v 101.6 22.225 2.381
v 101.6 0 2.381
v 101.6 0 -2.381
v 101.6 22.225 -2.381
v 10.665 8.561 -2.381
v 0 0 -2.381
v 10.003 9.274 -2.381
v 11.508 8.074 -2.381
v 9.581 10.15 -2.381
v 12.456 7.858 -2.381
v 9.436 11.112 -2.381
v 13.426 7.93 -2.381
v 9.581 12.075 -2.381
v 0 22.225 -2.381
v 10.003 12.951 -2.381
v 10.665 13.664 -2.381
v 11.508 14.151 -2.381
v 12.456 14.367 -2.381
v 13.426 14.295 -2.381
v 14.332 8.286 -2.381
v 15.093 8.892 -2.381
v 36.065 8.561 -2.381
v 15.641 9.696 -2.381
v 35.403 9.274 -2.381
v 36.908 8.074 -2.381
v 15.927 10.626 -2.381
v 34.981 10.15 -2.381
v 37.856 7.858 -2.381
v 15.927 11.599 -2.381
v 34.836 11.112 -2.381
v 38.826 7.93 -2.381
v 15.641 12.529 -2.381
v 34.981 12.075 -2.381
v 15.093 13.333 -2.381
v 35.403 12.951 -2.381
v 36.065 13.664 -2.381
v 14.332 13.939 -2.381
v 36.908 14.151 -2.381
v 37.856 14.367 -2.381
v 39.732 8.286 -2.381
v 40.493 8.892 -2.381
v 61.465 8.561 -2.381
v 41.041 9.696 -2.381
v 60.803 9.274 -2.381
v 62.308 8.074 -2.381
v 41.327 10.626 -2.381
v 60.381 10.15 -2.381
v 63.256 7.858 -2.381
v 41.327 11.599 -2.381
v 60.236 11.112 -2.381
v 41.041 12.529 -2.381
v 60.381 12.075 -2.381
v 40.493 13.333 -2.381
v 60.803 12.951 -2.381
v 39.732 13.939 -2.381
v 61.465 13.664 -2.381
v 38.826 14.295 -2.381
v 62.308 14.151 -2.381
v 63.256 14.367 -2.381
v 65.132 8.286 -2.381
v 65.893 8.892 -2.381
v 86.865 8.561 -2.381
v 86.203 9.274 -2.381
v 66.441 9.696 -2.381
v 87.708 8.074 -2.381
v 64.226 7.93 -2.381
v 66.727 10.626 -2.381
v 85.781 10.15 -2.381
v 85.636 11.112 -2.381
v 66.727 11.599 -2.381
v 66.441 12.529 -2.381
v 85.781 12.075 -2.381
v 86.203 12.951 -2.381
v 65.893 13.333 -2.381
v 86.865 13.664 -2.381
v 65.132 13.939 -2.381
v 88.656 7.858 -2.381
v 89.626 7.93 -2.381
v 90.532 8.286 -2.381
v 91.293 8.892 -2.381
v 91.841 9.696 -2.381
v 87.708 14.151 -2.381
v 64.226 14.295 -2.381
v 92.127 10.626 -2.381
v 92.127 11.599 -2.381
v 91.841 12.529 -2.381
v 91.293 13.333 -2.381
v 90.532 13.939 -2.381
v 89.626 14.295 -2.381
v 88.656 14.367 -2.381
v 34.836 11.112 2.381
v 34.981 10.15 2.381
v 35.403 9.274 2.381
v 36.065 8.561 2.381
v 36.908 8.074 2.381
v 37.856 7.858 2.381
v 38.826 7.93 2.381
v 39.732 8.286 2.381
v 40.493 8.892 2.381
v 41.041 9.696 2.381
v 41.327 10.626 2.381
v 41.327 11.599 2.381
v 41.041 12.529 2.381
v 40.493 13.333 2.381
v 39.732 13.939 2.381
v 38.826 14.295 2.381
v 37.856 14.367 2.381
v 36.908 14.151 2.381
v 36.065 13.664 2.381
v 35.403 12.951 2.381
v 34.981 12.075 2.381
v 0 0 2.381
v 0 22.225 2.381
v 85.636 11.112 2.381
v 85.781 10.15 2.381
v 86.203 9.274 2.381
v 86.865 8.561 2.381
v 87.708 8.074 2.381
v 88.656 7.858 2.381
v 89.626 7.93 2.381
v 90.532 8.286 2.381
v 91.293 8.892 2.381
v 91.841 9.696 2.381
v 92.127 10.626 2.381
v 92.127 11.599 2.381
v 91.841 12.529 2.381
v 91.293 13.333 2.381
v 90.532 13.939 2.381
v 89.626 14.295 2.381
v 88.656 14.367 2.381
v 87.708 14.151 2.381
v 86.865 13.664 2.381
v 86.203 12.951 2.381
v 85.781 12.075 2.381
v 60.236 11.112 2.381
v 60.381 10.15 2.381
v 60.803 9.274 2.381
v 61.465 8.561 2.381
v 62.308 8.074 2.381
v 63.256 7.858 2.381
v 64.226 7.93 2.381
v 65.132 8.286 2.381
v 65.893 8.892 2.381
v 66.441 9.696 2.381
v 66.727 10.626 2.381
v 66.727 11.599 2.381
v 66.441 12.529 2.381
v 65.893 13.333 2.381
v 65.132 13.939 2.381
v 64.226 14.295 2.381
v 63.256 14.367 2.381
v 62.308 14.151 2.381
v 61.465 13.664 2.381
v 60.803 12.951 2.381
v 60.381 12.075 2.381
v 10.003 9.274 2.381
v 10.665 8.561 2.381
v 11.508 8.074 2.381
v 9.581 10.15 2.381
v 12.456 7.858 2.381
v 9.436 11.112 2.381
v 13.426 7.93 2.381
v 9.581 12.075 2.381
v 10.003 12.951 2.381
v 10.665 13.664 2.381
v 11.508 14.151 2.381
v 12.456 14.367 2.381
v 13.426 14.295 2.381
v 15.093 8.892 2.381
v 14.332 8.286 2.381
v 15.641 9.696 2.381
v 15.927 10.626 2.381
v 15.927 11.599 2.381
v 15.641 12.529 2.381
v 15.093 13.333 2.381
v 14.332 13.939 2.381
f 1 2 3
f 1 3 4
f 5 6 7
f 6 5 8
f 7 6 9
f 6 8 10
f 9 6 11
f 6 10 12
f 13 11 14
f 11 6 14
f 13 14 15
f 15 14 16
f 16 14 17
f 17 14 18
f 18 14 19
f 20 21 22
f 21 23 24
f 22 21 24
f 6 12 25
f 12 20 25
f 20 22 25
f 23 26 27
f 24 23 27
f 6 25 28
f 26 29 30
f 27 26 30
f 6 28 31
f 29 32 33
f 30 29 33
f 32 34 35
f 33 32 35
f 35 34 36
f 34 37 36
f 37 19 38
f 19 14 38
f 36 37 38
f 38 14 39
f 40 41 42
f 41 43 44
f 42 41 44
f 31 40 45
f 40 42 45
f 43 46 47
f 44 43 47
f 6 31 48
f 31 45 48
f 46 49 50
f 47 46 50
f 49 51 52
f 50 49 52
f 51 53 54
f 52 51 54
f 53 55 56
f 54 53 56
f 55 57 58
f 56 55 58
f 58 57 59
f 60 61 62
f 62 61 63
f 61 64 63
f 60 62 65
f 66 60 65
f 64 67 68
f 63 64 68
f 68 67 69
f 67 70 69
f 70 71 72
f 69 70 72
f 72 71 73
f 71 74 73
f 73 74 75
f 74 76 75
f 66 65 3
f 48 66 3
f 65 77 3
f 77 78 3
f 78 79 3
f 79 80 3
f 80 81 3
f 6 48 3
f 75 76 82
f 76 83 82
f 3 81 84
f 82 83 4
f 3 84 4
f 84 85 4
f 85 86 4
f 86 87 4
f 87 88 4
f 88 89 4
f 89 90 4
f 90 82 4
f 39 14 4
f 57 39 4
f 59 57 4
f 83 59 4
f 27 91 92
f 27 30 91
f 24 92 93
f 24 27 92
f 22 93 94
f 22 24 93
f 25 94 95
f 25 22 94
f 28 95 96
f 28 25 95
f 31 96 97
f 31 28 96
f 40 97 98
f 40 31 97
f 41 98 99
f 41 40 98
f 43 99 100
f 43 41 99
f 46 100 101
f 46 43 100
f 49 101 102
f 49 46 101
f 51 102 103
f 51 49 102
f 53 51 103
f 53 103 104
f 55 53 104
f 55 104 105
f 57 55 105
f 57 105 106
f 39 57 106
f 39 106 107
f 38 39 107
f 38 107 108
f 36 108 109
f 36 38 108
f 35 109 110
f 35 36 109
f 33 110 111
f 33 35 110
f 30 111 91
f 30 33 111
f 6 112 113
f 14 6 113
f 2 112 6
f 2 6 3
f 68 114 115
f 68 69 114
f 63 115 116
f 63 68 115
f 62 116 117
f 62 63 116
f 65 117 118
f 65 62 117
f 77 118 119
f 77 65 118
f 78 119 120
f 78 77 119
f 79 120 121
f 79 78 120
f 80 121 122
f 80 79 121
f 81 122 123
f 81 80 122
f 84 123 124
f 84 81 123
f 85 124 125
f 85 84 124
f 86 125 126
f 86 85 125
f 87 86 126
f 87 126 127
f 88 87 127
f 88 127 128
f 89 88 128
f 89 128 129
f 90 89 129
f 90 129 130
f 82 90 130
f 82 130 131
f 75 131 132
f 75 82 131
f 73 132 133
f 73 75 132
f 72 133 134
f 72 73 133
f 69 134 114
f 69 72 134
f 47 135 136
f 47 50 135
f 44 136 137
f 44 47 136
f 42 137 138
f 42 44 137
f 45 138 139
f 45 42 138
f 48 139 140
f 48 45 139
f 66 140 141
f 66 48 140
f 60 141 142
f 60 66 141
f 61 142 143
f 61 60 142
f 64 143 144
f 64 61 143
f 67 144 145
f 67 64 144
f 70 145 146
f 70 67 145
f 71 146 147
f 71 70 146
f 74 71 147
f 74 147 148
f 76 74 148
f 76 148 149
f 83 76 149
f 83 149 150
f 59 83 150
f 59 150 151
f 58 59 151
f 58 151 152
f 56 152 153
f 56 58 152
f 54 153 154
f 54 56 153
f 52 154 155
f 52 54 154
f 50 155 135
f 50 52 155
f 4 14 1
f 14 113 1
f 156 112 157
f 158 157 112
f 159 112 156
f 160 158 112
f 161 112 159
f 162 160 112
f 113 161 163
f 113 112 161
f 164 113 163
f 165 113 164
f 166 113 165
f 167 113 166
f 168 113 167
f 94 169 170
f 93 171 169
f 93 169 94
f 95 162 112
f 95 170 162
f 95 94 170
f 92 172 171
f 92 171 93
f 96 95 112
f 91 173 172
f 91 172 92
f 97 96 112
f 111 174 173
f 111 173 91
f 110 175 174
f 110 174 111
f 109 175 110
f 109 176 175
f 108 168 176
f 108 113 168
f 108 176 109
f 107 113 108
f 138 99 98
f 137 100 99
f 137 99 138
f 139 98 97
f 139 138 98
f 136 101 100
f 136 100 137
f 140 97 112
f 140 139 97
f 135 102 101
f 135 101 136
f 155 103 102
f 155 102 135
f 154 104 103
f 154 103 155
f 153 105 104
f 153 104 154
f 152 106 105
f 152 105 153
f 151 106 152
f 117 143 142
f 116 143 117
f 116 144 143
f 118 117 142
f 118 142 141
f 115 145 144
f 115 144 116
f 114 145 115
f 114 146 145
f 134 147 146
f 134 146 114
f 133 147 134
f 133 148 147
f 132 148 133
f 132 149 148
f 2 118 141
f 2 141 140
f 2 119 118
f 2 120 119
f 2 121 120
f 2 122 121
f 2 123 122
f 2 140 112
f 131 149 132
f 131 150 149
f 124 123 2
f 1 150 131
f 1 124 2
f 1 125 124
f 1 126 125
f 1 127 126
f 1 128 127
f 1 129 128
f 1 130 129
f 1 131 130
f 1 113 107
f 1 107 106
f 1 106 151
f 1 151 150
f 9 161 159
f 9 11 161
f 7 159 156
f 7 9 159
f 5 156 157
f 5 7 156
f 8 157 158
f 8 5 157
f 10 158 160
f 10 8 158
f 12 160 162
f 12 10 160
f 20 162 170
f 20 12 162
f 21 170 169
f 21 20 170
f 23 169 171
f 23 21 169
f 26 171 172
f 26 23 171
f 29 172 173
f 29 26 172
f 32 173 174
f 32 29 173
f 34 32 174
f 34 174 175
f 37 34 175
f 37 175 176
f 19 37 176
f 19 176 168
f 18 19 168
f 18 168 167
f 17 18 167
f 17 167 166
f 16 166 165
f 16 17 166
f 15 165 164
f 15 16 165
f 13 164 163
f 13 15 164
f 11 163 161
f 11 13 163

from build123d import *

# Parameters (mm, degrees)
SKETCH1_W           = 101.6
SKETCH1_H           = 22.225
SKETCH1_R           = 3.2639
BOSS_EXTRUDE1_DEPTH = 2.38125


with BuildPart() as part:
    # Sketch1 → Boss-Extrude1 (new, symmetric)
    with BuildSketch(Plane.XY):
        with Locations((50.8, 11.1125)):
            Rectangle(SKETCH1_W, SKETCH1_H)
        with Locations(Location((12.7, 11.1125, 0), (0, 0, 180))):
            Circle(SKETCH1_R, mode=Mode.SUBTRACT)
        with Locations(Location((38.1, 11.1125, 0), (0, 0, 180))):
            Circle(SKETCH1_R, mode=Mode.SUBTRACT)
        with Locations(Location((63.5, 11.1125, 0), (0, 0, 180))):
            Circle(SKETCH1_R, mode=Mode.SUBTRACT)
        with Locations(Location((88.9, 11.1125, 0), (0, 0, 180))):
            Circle(SKETCH1_R, mode=Mode.SUBTRACT)
    extrude(amount=BOSS_EXTRUDE1_DEPTH, both=True)


solid = part.part
